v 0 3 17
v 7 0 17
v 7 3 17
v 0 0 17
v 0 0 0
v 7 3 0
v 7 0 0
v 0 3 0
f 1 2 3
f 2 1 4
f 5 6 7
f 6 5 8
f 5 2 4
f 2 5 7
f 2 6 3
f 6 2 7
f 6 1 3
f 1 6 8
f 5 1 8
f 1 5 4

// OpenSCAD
// Generated by SolidPython 1.0.1 on 2020-07-29 00:46:55


cube(size = [7, 3, 17]);
/***********************************************
*********      SolidPython code:      **********
************************************************
 
# import packages: SolidPython
from solid import *
from solid.utils import *
from itertools import chain, combinations, permutations


class Resize:

    def __init__(self, scad_file):
        self.scad_file = scad_file
        #self.scad_file = import_scad(scad_file)
        # cone/cylinder param:
        self.r1 = 0
        self.r2 = 0
        self.h = 0
        # rectangular prism param:
        self.w = 0
        self.l = 0
        # ellipse param:
        self.r = 0

    # import OpenScad code (file name corresponds to shape)


    # classify shape + parameters
    def assign(self, param1, param2, param3):
        if self.scad_file == 'cone.scad':
            self.r1 = param1
            self.r2 = param2
            self.h = param3
        elif self.scad_file == 'cylinder.scad':
            self.r1 = param1
            self.r2 = param2
            self.h = param3
        elif self.scad_file == 'rectangularPrism.scad':
            self.h = param1
            self.l = param2
            self.w = param3
        else:
            self.r = param1
            self.h = param2

    # resize parameters
    def iterate(self):
        x = range(3, 20, 2)
        i = 1
        if self.scad_file == 'cone.scad':
            tempList = list(permutations(x, 2))
            for temp in tempList:
                param1 = temp[0]
                param2 = temp[1]
                filepath = 'produced_scad_files/' + 'cone' + str(param1) + '_' + str(param2) + '_' + '.scad'
                scad_render_to_file(cylinder(h=param1, r1=param2, r2=0), filepath)

        elif self.scad_file == 'cylinder.scad':
            tempList = list(permutations(x, 3))
            for temp in tempList:
                param1 = temp[0]
                param2 = temp[1]
                filepath = 'produced_scad_files/' + 'cylinder' + str(param1) + '_' + str(param2) + '_' + '.scad'
                scad_render_to_file(cylinder(h=param1, r1=param2, r2=param2), filepath)

        elif self.scad_file == 'rectangularPrism.scad':
            tempList = list(permutations(x, 3))
            for temp in tempList:
                param1 = temp[0]
                param2 = temp[1]
                param3 = temp[2]
                filepath = 'produced_scad_files/' + 'rectangularPrism' + str(param1) + '_' + str(param2) + '_' + str(
                    param3) + '.scad'
                scad_render_to_file(cube(size=(param1, param2, param3)), filepath)

        elif self.scad_file == 'ellipse.scad':
            tempList = list(permutations(x, 4))
            for temp in tempList:
                param1 = temp[0]
                param2 = temp[1]
                param3 = temp[2]
                param4 = temp[3]
                filepath = 'produced_scad_files/' + 'ellipse' + str(param1) + '_' + str(param2) + '_' + str(param3) + '_' + str(param4) + '.scad'
                scad_render_to_file(scale([param1, param2, param3])(sphere(r=param4)), filepath)

    def render_to_scadfile(self):
        scad_render_to_file(scad, 'example.scad') 
 
************************************************/
